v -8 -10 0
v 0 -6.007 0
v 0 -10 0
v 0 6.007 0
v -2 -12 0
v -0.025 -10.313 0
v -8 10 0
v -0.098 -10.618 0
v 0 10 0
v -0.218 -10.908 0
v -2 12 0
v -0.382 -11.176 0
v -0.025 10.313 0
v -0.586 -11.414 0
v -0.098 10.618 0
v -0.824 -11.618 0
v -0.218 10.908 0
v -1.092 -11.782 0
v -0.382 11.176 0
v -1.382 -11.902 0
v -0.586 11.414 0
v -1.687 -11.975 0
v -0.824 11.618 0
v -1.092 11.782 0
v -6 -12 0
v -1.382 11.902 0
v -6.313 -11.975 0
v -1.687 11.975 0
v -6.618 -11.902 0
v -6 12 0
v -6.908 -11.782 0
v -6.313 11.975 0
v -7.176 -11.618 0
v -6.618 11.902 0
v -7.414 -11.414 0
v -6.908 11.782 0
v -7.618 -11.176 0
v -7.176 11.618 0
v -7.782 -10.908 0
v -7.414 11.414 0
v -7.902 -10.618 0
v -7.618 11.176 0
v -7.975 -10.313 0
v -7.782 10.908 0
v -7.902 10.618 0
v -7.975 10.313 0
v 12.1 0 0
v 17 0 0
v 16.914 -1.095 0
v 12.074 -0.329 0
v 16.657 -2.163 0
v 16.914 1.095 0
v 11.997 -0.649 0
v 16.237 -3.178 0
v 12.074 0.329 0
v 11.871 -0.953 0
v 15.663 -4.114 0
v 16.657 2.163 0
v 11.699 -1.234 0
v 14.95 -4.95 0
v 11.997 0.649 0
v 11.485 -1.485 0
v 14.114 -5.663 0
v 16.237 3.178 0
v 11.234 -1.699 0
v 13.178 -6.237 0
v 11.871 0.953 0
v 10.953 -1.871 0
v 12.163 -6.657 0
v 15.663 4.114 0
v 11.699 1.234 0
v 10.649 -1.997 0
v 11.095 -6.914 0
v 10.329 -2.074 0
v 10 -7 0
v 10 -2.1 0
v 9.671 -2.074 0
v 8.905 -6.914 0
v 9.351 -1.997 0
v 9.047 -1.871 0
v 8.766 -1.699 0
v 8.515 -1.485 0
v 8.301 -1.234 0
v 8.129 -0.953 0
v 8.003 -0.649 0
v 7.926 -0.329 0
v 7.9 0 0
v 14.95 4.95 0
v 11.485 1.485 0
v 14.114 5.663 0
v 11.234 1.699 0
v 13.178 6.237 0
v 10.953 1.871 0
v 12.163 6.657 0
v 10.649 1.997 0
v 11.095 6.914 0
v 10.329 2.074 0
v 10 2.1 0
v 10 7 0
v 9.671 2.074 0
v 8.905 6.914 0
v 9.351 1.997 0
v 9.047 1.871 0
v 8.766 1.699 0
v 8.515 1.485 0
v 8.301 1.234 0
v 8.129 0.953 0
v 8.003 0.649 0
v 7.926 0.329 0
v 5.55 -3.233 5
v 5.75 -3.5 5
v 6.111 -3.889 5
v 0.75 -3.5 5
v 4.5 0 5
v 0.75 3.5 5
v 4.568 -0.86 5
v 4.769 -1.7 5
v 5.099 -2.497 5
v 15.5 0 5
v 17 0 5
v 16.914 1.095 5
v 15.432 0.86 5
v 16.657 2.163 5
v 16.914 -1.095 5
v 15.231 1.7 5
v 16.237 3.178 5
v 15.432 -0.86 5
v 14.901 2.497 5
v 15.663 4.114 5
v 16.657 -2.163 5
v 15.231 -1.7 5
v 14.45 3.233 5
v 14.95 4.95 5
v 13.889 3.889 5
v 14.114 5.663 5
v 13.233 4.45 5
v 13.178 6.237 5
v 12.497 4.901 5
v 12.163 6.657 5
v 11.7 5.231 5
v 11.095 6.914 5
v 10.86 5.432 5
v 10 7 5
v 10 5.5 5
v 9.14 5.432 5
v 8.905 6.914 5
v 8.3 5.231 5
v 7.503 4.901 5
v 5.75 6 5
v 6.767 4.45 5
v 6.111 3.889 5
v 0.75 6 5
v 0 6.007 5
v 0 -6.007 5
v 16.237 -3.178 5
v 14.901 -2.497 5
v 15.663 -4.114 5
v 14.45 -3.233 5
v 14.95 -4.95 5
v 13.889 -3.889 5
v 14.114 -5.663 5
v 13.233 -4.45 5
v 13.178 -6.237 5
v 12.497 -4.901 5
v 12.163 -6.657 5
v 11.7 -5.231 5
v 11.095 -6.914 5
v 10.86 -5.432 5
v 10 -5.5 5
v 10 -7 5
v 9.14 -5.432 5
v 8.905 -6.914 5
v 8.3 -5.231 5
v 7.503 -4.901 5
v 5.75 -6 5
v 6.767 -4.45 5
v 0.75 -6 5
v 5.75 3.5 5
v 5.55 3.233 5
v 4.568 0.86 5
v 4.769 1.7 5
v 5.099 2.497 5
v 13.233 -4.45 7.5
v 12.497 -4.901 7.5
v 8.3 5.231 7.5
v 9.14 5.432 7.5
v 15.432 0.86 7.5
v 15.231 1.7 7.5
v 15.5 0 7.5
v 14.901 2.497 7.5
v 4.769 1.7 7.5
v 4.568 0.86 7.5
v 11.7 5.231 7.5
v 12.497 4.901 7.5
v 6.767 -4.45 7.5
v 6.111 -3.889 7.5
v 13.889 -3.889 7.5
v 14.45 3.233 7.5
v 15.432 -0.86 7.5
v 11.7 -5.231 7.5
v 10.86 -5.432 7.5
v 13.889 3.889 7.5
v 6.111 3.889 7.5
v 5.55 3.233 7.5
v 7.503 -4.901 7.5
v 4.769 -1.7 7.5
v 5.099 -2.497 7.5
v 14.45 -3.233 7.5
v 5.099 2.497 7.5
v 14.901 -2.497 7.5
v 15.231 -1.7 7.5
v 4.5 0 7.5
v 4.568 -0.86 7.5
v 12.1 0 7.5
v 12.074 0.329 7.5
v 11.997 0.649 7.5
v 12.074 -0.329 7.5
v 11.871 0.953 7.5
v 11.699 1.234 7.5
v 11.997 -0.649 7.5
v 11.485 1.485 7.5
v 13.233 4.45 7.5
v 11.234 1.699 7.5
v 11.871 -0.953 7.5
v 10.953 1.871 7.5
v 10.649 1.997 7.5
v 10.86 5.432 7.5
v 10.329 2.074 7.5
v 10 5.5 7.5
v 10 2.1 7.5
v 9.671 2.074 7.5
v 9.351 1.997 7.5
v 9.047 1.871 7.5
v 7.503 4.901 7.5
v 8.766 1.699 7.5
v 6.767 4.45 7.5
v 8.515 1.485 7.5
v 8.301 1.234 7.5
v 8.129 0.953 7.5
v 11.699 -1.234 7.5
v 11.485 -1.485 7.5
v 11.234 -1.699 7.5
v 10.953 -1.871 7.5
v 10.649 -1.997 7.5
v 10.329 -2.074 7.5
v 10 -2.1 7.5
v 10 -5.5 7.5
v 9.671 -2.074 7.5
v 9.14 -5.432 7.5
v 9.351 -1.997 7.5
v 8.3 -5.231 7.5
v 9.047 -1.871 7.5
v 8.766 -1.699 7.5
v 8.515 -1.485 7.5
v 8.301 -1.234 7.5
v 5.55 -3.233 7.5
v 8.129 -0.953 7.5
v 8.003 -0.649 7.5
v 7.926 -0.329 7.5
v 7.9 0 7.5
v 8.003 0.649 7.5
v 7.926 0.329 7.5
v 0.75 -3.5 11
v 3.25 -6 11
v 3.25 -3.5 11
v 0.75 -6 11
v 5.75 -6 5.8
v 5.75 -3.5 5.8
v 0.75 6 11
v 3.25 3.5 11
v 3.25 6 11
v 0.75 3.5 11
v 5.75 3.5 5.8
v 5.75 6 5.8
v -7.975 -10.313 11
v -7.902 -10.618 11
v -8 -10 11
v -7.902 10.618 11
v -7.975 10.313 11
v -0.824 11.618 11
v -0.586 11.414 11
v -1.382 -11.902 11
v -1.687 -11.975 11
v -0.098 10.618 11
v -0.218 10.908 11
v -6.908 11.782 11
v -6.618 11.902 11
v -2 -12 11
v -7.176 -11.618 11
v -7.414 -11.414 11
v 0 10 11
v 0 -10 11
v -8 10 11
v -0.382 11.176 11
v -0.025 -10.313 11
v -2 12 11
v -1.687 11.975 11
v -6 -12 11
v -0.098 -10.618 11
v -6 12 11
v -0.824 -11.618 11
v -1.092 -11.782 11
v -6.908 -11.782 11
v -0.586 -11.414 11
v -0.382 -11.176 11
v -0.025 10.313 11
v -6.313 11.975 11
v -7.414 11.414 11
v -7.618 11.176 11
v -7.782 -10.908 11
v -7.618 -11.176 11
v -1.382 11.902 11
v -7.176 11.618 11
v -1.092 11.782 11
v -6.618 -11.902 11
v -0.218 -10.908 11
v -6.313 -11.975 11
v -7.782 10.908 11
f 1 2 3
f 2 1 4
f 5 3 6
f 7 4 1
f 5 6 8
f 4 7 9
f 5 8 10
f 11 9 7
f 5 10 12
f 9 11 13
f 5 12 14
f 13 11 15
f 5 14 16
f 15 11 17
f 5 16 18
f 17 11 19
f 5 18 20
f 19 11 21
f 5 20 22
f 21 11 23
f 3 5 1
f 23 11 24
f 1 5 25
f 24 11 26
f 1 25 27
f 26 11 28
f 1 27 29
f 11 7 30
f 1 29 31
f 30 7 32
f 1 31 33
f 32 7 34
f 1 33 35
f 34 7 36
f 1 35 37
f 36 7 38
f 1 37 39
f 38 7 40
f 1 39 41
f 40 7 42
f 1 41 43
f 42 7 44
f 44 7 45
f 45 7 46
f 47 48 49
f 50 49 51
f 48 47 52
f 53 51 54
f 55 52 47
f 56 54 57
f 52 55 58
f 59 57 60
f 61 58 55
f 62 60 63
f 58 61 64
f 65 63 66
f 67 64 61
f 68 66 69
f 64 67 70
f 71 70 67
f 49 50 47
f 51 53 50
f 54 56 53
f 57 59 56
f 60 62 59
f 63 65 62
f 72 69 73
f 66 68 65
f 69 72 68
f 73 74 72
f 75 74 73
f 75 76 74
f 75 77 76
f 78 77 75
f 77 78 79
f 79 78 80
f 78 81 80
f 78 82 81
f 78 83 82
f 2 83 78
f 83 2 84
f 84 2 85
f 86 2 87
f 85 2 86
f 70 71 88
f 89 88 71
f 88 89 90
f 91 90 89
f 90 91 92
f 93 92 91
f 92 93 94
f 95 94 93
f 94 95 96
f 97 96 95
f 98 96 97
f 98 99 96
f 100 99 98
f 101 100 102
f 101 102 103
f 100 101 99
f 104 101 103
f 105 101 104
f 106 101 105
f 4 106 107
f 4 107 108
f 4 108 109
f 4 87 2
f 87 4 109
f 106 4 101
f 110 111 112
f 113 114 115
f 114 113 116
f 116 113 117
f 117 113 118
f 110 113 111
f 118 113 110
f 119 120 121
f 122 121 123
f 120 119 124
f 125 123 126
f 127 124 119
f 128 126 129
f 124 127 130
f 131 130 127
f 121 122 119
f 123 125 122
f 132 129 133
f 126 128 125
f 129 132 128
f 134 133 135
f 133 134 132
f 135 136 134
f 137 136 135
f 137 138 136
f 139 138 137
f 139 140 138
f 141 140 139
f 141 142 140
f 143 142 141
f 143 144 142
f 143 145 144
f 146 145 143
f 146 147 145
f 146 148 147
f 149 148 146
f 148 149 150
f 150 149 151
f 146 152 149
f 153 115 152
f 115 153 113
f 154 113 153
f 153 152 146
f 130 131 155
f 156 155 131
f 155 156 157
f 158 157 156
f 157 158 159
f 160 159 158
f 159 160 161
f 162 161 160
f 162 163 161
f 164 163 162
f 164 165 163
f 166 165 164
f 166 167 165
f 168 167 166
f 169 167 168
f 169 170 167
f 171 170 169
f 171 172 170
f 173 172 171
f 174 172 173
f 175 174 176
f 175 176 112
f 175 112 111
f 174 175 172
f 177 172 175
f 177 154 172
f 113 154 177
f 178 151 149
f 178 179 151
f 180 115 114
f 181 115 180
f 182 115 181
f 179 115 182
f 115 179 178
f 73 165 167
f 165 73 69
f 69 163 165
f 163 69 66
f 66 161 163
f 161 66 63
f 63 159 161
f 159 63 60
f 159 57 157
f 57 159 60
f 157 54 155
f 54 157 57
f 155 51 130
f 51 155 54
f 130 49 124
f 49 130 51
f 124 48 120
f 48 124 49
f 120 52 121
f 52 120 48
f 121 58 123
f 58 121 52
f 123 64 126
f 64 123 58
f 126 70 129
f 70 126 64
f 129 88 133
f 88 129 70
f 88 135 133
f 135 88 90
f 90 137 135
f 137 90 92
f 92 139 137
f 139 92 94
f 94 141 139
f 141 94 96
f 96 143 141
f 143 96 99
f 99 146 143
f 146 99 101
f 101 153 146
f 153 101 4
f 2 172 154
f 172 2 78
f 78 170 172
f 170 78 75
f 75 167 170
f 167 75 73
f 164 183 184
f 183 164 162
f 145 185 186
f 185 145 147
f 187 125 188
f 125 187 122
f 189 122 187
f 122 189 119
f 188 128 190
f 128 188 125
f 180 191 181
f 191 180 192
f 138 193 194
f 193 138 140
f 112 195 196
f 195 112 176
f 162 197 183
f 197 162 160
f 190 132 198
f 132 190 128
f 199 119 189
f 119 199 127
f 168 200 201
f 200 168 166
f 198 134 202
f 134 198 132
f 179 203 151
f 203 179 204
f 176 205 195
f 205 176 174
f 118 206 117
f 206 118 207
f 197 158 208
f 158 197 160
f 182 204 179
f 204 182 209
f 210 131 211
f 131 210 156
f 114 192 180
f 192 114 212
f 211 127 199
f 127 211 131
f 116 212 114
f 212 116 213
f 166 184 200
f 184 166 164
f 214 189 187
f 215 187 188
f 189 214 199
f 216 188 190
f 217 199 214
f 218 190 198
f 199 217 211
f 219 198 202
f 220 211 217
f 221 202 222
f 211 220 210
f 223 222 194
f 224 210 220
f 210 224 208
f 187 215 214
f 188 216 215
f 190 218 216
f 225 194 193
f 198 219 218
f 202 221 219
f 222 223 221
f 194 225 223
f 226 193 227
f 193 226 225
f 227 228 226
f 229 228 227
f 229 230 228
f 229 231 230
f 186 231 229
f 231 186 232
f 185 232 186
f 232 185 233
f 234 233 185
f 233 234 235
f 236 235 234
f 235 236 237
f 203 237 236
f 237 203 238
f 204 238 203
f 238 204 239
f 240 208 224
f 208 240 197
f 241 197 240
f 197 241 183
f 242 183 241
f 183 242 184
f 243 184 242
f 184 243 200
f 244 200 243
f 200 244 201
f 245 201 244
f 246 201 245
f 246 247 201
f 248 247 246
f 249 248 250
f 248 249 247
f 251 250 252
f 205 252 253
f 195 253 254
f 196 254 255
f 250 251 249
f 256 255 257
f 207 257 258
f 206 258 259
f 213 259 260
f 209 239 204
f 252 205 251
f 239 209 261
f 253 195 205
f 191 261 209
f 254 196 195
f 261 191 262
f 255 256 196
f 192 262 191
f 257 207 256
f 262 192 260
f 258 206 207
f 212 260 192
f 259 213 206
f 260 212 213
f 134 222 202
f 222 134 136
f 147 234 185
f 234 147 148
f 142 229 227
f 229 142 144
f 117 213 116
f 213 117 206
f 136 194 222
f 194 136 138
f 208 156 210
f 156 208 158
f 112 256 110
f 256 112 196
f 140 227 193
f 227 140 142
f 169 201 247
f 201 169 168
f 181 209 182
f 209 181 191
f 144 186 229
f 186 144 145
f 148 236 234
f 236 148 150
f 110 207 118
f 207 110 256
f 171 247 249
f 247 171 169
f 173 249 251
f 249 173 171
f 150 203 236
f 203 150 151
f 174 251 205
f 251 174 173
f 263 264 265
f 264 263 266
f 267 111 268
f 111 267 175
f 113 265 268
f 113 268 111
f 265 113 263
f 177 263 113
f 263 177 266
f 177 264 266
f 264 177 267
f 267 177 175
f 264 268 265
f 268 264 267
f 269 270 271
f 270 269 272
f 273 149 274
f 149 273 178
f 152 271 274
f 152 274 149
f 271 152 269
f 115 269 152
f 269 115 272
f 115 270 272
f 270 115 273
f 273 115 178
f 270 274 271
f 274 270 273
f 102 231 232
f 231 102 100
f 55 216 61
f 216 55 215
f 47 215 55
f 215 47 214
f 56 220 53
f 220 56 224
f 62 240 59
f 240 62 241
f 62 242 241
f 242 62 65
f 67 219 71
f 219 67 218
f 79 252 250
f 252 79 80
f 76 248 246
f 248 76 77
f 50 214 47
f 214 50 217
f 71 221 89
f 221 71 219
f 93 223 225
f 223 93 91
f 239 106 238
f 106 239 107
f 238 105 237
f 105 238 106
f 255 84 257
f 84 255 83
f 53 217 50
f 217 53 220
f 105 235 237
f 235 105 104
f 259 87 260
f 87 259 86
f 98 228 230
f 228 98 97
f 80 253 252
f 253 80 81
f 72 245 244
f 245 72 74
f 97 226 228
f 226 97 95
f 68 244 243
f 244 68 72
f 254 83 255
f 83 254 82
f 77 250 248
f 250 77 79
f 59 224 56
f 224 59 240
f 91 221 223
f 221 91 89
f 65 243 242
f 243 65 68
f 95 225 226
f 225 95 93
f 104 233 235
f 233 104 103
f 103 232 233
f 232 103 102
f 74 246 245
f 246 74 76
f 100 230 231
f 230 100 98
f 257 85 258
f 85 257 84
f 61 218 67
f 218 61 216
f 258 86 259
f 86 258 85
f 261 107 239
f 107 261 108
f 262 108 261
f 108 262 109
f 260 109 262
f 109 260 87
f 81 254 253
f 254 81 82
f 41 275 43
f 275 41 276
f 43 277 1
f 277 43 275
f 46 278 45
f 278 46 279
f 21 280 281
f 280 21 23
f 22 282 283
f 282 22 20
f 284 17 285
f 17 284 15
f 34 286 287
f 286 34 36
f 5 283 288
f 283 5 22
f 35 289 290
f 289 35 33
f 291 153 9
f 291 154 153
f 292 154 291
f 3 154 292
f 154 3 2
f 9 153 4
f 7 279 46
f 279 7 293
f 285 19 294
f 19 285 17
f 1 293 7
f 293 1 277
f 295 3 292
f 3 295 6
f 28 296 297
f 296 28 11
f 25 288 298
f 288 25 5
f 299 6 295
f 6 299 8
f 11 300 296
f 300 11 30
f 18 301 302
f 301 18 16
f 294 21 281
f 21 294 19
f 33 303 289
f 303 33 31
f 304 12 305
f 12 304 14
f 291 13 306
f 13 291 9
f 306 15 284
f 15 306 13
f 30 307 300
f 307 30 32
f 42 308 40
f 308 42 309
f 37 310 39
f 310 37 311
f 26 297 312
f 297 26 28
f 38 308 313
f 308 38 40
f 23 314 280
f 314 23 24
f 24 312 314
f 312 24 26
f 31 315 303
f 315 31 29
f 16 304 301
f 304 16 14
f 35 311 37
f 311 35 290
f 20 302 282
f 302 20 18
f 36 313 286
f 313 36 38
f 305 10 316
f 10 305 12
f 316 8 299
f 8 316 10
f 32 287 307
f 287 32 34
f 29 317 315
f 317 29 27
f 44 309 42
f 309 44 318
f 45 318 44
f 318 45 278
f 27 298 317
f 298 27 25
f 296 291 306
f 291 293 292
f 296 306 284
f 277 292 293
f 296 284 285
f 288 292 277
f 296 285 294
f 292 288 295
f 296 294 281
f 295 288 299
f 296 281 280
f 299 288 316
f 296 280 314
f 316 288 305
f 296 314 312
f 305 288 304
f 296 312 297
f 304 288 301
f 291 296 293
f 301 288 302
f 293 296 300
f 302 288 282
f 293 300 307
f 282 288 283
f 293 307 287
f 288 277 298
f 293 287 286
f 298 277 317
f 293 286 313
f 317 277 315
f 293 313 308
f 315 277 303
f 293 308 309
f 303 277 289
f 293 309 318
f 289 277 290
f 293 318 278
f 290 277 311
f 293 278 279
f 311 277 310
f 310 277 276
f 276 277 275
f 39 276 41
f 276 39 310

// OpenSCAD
// Reusable refined rounded external mounting ear.
// The ear is modeled as an oval/teardrop lug with a broad root neck,
// raised screw boss, and two clean gussets.

$fn = 40;

ear_length = 20.0;
ear_width = 14.0;
ear_thickness = 5.0;
ear_radius = 5.0;
hole_diameter = 4.2;
boss_outer_diameter = 11.0;
boss_height = 2.5;
neck_width = 12.0;
neck_overlap = 4.0;
edge_rounding = 2.0;
gusset_thickness = 2.5;
gusset_height = 6.0;
gusset_length = 10.0;
show_example_body_stub = true;

module rounded_rect_2d(w, d, r) {
    rr = max(0.01, min(r, min(w, d) / 2 - 0.01));
    hull() {
        for (x = [rr, w - rr])
            for (y = [rr, d - rr])
                translate([x, y])
                    circle(r = rr);
    }
}

module rounded_block(size, r = 1.0) {
    linear_extrude(height = size[2])
        rounded_rect_2d(size[0], size[1], r);
}

module mount_ear_boss(x, y, thickness, boss_d, boss_h) {
    translate([x, y, thickness])
        cylinder(h = boss_h, d = boss_d);
}

module mount_ear_gusset(x0, y0, x1, y1, thickness, height) {
    hull() {
        translate([x0 - thickness / 2, y0 - thickness / 2, ear_thickness])
            cube([thickness, thickness, height]);
        translate([x1 - thickness / 2, y1 - thickness / 2, ear_thickness])
            cube([thickness, thickness, 0.8]);
    }
}

module refined_mount_ear(
    length = ear_length,
    width = ear_width,
    thickness = ear_thickness,
    hole_d = hole_diameter,
    boss_d = boss_outer_diameter,
    boss_h = boss_height
) {
    screw_x = length / 2;
    root_x = 0;
    root_r = min(edge_rounding, neck_width / 2 - 0.1);
    rib_y = neck_width / 2 - gusset_thickness / 2;

    difference() {
        union() {
            linear_extrude(height = thickness)
                union() {
                    hull() {
                        translate([screw_x, 0])
                            circle(d = width);
                        translate([root_x, -neck_width / 2 + root_r])
                            circle(r = root_r);
                        translate([root_x, neck_width / 2 - root_r])
                            circle(r = root_r);
                    }

                    translate([-neck_overlap, -neck_width / 2])
                        rounded_rect_2d(
                            neck_overlap + length * 0.42,
                            neck_width,
                            edge_rounding
                        );
                }

            mount_ear_boss(screw_x, 0, thickness, boss_d, boss_h);

            mount_ear_gusset(
                root_x + edge_rounding,
                -rib_y,
                screw_x - gusset_length * 0.55,
                -rib_y,
                gusset_thickness,
                gusset_height
            );
            mount_ear_gusset(
                root_x + edge_rounding,
                rib_y,
                screw_x - gusset_length * 0.55,
                rib_y,
                gusset_thickness,
                gusset_height
            );
        }

        translate([screw_x, 0, -0.5])
            cylinder(h = thickness + boss_h + 1.0, d = hole_d);
    }
}

if (show_example_body_stub) {
    translate([-8, -12, 0])
        rounded_block([8, 24, ear_thickness + gusset_height], 2.0);
}

refined_mount_ear();
